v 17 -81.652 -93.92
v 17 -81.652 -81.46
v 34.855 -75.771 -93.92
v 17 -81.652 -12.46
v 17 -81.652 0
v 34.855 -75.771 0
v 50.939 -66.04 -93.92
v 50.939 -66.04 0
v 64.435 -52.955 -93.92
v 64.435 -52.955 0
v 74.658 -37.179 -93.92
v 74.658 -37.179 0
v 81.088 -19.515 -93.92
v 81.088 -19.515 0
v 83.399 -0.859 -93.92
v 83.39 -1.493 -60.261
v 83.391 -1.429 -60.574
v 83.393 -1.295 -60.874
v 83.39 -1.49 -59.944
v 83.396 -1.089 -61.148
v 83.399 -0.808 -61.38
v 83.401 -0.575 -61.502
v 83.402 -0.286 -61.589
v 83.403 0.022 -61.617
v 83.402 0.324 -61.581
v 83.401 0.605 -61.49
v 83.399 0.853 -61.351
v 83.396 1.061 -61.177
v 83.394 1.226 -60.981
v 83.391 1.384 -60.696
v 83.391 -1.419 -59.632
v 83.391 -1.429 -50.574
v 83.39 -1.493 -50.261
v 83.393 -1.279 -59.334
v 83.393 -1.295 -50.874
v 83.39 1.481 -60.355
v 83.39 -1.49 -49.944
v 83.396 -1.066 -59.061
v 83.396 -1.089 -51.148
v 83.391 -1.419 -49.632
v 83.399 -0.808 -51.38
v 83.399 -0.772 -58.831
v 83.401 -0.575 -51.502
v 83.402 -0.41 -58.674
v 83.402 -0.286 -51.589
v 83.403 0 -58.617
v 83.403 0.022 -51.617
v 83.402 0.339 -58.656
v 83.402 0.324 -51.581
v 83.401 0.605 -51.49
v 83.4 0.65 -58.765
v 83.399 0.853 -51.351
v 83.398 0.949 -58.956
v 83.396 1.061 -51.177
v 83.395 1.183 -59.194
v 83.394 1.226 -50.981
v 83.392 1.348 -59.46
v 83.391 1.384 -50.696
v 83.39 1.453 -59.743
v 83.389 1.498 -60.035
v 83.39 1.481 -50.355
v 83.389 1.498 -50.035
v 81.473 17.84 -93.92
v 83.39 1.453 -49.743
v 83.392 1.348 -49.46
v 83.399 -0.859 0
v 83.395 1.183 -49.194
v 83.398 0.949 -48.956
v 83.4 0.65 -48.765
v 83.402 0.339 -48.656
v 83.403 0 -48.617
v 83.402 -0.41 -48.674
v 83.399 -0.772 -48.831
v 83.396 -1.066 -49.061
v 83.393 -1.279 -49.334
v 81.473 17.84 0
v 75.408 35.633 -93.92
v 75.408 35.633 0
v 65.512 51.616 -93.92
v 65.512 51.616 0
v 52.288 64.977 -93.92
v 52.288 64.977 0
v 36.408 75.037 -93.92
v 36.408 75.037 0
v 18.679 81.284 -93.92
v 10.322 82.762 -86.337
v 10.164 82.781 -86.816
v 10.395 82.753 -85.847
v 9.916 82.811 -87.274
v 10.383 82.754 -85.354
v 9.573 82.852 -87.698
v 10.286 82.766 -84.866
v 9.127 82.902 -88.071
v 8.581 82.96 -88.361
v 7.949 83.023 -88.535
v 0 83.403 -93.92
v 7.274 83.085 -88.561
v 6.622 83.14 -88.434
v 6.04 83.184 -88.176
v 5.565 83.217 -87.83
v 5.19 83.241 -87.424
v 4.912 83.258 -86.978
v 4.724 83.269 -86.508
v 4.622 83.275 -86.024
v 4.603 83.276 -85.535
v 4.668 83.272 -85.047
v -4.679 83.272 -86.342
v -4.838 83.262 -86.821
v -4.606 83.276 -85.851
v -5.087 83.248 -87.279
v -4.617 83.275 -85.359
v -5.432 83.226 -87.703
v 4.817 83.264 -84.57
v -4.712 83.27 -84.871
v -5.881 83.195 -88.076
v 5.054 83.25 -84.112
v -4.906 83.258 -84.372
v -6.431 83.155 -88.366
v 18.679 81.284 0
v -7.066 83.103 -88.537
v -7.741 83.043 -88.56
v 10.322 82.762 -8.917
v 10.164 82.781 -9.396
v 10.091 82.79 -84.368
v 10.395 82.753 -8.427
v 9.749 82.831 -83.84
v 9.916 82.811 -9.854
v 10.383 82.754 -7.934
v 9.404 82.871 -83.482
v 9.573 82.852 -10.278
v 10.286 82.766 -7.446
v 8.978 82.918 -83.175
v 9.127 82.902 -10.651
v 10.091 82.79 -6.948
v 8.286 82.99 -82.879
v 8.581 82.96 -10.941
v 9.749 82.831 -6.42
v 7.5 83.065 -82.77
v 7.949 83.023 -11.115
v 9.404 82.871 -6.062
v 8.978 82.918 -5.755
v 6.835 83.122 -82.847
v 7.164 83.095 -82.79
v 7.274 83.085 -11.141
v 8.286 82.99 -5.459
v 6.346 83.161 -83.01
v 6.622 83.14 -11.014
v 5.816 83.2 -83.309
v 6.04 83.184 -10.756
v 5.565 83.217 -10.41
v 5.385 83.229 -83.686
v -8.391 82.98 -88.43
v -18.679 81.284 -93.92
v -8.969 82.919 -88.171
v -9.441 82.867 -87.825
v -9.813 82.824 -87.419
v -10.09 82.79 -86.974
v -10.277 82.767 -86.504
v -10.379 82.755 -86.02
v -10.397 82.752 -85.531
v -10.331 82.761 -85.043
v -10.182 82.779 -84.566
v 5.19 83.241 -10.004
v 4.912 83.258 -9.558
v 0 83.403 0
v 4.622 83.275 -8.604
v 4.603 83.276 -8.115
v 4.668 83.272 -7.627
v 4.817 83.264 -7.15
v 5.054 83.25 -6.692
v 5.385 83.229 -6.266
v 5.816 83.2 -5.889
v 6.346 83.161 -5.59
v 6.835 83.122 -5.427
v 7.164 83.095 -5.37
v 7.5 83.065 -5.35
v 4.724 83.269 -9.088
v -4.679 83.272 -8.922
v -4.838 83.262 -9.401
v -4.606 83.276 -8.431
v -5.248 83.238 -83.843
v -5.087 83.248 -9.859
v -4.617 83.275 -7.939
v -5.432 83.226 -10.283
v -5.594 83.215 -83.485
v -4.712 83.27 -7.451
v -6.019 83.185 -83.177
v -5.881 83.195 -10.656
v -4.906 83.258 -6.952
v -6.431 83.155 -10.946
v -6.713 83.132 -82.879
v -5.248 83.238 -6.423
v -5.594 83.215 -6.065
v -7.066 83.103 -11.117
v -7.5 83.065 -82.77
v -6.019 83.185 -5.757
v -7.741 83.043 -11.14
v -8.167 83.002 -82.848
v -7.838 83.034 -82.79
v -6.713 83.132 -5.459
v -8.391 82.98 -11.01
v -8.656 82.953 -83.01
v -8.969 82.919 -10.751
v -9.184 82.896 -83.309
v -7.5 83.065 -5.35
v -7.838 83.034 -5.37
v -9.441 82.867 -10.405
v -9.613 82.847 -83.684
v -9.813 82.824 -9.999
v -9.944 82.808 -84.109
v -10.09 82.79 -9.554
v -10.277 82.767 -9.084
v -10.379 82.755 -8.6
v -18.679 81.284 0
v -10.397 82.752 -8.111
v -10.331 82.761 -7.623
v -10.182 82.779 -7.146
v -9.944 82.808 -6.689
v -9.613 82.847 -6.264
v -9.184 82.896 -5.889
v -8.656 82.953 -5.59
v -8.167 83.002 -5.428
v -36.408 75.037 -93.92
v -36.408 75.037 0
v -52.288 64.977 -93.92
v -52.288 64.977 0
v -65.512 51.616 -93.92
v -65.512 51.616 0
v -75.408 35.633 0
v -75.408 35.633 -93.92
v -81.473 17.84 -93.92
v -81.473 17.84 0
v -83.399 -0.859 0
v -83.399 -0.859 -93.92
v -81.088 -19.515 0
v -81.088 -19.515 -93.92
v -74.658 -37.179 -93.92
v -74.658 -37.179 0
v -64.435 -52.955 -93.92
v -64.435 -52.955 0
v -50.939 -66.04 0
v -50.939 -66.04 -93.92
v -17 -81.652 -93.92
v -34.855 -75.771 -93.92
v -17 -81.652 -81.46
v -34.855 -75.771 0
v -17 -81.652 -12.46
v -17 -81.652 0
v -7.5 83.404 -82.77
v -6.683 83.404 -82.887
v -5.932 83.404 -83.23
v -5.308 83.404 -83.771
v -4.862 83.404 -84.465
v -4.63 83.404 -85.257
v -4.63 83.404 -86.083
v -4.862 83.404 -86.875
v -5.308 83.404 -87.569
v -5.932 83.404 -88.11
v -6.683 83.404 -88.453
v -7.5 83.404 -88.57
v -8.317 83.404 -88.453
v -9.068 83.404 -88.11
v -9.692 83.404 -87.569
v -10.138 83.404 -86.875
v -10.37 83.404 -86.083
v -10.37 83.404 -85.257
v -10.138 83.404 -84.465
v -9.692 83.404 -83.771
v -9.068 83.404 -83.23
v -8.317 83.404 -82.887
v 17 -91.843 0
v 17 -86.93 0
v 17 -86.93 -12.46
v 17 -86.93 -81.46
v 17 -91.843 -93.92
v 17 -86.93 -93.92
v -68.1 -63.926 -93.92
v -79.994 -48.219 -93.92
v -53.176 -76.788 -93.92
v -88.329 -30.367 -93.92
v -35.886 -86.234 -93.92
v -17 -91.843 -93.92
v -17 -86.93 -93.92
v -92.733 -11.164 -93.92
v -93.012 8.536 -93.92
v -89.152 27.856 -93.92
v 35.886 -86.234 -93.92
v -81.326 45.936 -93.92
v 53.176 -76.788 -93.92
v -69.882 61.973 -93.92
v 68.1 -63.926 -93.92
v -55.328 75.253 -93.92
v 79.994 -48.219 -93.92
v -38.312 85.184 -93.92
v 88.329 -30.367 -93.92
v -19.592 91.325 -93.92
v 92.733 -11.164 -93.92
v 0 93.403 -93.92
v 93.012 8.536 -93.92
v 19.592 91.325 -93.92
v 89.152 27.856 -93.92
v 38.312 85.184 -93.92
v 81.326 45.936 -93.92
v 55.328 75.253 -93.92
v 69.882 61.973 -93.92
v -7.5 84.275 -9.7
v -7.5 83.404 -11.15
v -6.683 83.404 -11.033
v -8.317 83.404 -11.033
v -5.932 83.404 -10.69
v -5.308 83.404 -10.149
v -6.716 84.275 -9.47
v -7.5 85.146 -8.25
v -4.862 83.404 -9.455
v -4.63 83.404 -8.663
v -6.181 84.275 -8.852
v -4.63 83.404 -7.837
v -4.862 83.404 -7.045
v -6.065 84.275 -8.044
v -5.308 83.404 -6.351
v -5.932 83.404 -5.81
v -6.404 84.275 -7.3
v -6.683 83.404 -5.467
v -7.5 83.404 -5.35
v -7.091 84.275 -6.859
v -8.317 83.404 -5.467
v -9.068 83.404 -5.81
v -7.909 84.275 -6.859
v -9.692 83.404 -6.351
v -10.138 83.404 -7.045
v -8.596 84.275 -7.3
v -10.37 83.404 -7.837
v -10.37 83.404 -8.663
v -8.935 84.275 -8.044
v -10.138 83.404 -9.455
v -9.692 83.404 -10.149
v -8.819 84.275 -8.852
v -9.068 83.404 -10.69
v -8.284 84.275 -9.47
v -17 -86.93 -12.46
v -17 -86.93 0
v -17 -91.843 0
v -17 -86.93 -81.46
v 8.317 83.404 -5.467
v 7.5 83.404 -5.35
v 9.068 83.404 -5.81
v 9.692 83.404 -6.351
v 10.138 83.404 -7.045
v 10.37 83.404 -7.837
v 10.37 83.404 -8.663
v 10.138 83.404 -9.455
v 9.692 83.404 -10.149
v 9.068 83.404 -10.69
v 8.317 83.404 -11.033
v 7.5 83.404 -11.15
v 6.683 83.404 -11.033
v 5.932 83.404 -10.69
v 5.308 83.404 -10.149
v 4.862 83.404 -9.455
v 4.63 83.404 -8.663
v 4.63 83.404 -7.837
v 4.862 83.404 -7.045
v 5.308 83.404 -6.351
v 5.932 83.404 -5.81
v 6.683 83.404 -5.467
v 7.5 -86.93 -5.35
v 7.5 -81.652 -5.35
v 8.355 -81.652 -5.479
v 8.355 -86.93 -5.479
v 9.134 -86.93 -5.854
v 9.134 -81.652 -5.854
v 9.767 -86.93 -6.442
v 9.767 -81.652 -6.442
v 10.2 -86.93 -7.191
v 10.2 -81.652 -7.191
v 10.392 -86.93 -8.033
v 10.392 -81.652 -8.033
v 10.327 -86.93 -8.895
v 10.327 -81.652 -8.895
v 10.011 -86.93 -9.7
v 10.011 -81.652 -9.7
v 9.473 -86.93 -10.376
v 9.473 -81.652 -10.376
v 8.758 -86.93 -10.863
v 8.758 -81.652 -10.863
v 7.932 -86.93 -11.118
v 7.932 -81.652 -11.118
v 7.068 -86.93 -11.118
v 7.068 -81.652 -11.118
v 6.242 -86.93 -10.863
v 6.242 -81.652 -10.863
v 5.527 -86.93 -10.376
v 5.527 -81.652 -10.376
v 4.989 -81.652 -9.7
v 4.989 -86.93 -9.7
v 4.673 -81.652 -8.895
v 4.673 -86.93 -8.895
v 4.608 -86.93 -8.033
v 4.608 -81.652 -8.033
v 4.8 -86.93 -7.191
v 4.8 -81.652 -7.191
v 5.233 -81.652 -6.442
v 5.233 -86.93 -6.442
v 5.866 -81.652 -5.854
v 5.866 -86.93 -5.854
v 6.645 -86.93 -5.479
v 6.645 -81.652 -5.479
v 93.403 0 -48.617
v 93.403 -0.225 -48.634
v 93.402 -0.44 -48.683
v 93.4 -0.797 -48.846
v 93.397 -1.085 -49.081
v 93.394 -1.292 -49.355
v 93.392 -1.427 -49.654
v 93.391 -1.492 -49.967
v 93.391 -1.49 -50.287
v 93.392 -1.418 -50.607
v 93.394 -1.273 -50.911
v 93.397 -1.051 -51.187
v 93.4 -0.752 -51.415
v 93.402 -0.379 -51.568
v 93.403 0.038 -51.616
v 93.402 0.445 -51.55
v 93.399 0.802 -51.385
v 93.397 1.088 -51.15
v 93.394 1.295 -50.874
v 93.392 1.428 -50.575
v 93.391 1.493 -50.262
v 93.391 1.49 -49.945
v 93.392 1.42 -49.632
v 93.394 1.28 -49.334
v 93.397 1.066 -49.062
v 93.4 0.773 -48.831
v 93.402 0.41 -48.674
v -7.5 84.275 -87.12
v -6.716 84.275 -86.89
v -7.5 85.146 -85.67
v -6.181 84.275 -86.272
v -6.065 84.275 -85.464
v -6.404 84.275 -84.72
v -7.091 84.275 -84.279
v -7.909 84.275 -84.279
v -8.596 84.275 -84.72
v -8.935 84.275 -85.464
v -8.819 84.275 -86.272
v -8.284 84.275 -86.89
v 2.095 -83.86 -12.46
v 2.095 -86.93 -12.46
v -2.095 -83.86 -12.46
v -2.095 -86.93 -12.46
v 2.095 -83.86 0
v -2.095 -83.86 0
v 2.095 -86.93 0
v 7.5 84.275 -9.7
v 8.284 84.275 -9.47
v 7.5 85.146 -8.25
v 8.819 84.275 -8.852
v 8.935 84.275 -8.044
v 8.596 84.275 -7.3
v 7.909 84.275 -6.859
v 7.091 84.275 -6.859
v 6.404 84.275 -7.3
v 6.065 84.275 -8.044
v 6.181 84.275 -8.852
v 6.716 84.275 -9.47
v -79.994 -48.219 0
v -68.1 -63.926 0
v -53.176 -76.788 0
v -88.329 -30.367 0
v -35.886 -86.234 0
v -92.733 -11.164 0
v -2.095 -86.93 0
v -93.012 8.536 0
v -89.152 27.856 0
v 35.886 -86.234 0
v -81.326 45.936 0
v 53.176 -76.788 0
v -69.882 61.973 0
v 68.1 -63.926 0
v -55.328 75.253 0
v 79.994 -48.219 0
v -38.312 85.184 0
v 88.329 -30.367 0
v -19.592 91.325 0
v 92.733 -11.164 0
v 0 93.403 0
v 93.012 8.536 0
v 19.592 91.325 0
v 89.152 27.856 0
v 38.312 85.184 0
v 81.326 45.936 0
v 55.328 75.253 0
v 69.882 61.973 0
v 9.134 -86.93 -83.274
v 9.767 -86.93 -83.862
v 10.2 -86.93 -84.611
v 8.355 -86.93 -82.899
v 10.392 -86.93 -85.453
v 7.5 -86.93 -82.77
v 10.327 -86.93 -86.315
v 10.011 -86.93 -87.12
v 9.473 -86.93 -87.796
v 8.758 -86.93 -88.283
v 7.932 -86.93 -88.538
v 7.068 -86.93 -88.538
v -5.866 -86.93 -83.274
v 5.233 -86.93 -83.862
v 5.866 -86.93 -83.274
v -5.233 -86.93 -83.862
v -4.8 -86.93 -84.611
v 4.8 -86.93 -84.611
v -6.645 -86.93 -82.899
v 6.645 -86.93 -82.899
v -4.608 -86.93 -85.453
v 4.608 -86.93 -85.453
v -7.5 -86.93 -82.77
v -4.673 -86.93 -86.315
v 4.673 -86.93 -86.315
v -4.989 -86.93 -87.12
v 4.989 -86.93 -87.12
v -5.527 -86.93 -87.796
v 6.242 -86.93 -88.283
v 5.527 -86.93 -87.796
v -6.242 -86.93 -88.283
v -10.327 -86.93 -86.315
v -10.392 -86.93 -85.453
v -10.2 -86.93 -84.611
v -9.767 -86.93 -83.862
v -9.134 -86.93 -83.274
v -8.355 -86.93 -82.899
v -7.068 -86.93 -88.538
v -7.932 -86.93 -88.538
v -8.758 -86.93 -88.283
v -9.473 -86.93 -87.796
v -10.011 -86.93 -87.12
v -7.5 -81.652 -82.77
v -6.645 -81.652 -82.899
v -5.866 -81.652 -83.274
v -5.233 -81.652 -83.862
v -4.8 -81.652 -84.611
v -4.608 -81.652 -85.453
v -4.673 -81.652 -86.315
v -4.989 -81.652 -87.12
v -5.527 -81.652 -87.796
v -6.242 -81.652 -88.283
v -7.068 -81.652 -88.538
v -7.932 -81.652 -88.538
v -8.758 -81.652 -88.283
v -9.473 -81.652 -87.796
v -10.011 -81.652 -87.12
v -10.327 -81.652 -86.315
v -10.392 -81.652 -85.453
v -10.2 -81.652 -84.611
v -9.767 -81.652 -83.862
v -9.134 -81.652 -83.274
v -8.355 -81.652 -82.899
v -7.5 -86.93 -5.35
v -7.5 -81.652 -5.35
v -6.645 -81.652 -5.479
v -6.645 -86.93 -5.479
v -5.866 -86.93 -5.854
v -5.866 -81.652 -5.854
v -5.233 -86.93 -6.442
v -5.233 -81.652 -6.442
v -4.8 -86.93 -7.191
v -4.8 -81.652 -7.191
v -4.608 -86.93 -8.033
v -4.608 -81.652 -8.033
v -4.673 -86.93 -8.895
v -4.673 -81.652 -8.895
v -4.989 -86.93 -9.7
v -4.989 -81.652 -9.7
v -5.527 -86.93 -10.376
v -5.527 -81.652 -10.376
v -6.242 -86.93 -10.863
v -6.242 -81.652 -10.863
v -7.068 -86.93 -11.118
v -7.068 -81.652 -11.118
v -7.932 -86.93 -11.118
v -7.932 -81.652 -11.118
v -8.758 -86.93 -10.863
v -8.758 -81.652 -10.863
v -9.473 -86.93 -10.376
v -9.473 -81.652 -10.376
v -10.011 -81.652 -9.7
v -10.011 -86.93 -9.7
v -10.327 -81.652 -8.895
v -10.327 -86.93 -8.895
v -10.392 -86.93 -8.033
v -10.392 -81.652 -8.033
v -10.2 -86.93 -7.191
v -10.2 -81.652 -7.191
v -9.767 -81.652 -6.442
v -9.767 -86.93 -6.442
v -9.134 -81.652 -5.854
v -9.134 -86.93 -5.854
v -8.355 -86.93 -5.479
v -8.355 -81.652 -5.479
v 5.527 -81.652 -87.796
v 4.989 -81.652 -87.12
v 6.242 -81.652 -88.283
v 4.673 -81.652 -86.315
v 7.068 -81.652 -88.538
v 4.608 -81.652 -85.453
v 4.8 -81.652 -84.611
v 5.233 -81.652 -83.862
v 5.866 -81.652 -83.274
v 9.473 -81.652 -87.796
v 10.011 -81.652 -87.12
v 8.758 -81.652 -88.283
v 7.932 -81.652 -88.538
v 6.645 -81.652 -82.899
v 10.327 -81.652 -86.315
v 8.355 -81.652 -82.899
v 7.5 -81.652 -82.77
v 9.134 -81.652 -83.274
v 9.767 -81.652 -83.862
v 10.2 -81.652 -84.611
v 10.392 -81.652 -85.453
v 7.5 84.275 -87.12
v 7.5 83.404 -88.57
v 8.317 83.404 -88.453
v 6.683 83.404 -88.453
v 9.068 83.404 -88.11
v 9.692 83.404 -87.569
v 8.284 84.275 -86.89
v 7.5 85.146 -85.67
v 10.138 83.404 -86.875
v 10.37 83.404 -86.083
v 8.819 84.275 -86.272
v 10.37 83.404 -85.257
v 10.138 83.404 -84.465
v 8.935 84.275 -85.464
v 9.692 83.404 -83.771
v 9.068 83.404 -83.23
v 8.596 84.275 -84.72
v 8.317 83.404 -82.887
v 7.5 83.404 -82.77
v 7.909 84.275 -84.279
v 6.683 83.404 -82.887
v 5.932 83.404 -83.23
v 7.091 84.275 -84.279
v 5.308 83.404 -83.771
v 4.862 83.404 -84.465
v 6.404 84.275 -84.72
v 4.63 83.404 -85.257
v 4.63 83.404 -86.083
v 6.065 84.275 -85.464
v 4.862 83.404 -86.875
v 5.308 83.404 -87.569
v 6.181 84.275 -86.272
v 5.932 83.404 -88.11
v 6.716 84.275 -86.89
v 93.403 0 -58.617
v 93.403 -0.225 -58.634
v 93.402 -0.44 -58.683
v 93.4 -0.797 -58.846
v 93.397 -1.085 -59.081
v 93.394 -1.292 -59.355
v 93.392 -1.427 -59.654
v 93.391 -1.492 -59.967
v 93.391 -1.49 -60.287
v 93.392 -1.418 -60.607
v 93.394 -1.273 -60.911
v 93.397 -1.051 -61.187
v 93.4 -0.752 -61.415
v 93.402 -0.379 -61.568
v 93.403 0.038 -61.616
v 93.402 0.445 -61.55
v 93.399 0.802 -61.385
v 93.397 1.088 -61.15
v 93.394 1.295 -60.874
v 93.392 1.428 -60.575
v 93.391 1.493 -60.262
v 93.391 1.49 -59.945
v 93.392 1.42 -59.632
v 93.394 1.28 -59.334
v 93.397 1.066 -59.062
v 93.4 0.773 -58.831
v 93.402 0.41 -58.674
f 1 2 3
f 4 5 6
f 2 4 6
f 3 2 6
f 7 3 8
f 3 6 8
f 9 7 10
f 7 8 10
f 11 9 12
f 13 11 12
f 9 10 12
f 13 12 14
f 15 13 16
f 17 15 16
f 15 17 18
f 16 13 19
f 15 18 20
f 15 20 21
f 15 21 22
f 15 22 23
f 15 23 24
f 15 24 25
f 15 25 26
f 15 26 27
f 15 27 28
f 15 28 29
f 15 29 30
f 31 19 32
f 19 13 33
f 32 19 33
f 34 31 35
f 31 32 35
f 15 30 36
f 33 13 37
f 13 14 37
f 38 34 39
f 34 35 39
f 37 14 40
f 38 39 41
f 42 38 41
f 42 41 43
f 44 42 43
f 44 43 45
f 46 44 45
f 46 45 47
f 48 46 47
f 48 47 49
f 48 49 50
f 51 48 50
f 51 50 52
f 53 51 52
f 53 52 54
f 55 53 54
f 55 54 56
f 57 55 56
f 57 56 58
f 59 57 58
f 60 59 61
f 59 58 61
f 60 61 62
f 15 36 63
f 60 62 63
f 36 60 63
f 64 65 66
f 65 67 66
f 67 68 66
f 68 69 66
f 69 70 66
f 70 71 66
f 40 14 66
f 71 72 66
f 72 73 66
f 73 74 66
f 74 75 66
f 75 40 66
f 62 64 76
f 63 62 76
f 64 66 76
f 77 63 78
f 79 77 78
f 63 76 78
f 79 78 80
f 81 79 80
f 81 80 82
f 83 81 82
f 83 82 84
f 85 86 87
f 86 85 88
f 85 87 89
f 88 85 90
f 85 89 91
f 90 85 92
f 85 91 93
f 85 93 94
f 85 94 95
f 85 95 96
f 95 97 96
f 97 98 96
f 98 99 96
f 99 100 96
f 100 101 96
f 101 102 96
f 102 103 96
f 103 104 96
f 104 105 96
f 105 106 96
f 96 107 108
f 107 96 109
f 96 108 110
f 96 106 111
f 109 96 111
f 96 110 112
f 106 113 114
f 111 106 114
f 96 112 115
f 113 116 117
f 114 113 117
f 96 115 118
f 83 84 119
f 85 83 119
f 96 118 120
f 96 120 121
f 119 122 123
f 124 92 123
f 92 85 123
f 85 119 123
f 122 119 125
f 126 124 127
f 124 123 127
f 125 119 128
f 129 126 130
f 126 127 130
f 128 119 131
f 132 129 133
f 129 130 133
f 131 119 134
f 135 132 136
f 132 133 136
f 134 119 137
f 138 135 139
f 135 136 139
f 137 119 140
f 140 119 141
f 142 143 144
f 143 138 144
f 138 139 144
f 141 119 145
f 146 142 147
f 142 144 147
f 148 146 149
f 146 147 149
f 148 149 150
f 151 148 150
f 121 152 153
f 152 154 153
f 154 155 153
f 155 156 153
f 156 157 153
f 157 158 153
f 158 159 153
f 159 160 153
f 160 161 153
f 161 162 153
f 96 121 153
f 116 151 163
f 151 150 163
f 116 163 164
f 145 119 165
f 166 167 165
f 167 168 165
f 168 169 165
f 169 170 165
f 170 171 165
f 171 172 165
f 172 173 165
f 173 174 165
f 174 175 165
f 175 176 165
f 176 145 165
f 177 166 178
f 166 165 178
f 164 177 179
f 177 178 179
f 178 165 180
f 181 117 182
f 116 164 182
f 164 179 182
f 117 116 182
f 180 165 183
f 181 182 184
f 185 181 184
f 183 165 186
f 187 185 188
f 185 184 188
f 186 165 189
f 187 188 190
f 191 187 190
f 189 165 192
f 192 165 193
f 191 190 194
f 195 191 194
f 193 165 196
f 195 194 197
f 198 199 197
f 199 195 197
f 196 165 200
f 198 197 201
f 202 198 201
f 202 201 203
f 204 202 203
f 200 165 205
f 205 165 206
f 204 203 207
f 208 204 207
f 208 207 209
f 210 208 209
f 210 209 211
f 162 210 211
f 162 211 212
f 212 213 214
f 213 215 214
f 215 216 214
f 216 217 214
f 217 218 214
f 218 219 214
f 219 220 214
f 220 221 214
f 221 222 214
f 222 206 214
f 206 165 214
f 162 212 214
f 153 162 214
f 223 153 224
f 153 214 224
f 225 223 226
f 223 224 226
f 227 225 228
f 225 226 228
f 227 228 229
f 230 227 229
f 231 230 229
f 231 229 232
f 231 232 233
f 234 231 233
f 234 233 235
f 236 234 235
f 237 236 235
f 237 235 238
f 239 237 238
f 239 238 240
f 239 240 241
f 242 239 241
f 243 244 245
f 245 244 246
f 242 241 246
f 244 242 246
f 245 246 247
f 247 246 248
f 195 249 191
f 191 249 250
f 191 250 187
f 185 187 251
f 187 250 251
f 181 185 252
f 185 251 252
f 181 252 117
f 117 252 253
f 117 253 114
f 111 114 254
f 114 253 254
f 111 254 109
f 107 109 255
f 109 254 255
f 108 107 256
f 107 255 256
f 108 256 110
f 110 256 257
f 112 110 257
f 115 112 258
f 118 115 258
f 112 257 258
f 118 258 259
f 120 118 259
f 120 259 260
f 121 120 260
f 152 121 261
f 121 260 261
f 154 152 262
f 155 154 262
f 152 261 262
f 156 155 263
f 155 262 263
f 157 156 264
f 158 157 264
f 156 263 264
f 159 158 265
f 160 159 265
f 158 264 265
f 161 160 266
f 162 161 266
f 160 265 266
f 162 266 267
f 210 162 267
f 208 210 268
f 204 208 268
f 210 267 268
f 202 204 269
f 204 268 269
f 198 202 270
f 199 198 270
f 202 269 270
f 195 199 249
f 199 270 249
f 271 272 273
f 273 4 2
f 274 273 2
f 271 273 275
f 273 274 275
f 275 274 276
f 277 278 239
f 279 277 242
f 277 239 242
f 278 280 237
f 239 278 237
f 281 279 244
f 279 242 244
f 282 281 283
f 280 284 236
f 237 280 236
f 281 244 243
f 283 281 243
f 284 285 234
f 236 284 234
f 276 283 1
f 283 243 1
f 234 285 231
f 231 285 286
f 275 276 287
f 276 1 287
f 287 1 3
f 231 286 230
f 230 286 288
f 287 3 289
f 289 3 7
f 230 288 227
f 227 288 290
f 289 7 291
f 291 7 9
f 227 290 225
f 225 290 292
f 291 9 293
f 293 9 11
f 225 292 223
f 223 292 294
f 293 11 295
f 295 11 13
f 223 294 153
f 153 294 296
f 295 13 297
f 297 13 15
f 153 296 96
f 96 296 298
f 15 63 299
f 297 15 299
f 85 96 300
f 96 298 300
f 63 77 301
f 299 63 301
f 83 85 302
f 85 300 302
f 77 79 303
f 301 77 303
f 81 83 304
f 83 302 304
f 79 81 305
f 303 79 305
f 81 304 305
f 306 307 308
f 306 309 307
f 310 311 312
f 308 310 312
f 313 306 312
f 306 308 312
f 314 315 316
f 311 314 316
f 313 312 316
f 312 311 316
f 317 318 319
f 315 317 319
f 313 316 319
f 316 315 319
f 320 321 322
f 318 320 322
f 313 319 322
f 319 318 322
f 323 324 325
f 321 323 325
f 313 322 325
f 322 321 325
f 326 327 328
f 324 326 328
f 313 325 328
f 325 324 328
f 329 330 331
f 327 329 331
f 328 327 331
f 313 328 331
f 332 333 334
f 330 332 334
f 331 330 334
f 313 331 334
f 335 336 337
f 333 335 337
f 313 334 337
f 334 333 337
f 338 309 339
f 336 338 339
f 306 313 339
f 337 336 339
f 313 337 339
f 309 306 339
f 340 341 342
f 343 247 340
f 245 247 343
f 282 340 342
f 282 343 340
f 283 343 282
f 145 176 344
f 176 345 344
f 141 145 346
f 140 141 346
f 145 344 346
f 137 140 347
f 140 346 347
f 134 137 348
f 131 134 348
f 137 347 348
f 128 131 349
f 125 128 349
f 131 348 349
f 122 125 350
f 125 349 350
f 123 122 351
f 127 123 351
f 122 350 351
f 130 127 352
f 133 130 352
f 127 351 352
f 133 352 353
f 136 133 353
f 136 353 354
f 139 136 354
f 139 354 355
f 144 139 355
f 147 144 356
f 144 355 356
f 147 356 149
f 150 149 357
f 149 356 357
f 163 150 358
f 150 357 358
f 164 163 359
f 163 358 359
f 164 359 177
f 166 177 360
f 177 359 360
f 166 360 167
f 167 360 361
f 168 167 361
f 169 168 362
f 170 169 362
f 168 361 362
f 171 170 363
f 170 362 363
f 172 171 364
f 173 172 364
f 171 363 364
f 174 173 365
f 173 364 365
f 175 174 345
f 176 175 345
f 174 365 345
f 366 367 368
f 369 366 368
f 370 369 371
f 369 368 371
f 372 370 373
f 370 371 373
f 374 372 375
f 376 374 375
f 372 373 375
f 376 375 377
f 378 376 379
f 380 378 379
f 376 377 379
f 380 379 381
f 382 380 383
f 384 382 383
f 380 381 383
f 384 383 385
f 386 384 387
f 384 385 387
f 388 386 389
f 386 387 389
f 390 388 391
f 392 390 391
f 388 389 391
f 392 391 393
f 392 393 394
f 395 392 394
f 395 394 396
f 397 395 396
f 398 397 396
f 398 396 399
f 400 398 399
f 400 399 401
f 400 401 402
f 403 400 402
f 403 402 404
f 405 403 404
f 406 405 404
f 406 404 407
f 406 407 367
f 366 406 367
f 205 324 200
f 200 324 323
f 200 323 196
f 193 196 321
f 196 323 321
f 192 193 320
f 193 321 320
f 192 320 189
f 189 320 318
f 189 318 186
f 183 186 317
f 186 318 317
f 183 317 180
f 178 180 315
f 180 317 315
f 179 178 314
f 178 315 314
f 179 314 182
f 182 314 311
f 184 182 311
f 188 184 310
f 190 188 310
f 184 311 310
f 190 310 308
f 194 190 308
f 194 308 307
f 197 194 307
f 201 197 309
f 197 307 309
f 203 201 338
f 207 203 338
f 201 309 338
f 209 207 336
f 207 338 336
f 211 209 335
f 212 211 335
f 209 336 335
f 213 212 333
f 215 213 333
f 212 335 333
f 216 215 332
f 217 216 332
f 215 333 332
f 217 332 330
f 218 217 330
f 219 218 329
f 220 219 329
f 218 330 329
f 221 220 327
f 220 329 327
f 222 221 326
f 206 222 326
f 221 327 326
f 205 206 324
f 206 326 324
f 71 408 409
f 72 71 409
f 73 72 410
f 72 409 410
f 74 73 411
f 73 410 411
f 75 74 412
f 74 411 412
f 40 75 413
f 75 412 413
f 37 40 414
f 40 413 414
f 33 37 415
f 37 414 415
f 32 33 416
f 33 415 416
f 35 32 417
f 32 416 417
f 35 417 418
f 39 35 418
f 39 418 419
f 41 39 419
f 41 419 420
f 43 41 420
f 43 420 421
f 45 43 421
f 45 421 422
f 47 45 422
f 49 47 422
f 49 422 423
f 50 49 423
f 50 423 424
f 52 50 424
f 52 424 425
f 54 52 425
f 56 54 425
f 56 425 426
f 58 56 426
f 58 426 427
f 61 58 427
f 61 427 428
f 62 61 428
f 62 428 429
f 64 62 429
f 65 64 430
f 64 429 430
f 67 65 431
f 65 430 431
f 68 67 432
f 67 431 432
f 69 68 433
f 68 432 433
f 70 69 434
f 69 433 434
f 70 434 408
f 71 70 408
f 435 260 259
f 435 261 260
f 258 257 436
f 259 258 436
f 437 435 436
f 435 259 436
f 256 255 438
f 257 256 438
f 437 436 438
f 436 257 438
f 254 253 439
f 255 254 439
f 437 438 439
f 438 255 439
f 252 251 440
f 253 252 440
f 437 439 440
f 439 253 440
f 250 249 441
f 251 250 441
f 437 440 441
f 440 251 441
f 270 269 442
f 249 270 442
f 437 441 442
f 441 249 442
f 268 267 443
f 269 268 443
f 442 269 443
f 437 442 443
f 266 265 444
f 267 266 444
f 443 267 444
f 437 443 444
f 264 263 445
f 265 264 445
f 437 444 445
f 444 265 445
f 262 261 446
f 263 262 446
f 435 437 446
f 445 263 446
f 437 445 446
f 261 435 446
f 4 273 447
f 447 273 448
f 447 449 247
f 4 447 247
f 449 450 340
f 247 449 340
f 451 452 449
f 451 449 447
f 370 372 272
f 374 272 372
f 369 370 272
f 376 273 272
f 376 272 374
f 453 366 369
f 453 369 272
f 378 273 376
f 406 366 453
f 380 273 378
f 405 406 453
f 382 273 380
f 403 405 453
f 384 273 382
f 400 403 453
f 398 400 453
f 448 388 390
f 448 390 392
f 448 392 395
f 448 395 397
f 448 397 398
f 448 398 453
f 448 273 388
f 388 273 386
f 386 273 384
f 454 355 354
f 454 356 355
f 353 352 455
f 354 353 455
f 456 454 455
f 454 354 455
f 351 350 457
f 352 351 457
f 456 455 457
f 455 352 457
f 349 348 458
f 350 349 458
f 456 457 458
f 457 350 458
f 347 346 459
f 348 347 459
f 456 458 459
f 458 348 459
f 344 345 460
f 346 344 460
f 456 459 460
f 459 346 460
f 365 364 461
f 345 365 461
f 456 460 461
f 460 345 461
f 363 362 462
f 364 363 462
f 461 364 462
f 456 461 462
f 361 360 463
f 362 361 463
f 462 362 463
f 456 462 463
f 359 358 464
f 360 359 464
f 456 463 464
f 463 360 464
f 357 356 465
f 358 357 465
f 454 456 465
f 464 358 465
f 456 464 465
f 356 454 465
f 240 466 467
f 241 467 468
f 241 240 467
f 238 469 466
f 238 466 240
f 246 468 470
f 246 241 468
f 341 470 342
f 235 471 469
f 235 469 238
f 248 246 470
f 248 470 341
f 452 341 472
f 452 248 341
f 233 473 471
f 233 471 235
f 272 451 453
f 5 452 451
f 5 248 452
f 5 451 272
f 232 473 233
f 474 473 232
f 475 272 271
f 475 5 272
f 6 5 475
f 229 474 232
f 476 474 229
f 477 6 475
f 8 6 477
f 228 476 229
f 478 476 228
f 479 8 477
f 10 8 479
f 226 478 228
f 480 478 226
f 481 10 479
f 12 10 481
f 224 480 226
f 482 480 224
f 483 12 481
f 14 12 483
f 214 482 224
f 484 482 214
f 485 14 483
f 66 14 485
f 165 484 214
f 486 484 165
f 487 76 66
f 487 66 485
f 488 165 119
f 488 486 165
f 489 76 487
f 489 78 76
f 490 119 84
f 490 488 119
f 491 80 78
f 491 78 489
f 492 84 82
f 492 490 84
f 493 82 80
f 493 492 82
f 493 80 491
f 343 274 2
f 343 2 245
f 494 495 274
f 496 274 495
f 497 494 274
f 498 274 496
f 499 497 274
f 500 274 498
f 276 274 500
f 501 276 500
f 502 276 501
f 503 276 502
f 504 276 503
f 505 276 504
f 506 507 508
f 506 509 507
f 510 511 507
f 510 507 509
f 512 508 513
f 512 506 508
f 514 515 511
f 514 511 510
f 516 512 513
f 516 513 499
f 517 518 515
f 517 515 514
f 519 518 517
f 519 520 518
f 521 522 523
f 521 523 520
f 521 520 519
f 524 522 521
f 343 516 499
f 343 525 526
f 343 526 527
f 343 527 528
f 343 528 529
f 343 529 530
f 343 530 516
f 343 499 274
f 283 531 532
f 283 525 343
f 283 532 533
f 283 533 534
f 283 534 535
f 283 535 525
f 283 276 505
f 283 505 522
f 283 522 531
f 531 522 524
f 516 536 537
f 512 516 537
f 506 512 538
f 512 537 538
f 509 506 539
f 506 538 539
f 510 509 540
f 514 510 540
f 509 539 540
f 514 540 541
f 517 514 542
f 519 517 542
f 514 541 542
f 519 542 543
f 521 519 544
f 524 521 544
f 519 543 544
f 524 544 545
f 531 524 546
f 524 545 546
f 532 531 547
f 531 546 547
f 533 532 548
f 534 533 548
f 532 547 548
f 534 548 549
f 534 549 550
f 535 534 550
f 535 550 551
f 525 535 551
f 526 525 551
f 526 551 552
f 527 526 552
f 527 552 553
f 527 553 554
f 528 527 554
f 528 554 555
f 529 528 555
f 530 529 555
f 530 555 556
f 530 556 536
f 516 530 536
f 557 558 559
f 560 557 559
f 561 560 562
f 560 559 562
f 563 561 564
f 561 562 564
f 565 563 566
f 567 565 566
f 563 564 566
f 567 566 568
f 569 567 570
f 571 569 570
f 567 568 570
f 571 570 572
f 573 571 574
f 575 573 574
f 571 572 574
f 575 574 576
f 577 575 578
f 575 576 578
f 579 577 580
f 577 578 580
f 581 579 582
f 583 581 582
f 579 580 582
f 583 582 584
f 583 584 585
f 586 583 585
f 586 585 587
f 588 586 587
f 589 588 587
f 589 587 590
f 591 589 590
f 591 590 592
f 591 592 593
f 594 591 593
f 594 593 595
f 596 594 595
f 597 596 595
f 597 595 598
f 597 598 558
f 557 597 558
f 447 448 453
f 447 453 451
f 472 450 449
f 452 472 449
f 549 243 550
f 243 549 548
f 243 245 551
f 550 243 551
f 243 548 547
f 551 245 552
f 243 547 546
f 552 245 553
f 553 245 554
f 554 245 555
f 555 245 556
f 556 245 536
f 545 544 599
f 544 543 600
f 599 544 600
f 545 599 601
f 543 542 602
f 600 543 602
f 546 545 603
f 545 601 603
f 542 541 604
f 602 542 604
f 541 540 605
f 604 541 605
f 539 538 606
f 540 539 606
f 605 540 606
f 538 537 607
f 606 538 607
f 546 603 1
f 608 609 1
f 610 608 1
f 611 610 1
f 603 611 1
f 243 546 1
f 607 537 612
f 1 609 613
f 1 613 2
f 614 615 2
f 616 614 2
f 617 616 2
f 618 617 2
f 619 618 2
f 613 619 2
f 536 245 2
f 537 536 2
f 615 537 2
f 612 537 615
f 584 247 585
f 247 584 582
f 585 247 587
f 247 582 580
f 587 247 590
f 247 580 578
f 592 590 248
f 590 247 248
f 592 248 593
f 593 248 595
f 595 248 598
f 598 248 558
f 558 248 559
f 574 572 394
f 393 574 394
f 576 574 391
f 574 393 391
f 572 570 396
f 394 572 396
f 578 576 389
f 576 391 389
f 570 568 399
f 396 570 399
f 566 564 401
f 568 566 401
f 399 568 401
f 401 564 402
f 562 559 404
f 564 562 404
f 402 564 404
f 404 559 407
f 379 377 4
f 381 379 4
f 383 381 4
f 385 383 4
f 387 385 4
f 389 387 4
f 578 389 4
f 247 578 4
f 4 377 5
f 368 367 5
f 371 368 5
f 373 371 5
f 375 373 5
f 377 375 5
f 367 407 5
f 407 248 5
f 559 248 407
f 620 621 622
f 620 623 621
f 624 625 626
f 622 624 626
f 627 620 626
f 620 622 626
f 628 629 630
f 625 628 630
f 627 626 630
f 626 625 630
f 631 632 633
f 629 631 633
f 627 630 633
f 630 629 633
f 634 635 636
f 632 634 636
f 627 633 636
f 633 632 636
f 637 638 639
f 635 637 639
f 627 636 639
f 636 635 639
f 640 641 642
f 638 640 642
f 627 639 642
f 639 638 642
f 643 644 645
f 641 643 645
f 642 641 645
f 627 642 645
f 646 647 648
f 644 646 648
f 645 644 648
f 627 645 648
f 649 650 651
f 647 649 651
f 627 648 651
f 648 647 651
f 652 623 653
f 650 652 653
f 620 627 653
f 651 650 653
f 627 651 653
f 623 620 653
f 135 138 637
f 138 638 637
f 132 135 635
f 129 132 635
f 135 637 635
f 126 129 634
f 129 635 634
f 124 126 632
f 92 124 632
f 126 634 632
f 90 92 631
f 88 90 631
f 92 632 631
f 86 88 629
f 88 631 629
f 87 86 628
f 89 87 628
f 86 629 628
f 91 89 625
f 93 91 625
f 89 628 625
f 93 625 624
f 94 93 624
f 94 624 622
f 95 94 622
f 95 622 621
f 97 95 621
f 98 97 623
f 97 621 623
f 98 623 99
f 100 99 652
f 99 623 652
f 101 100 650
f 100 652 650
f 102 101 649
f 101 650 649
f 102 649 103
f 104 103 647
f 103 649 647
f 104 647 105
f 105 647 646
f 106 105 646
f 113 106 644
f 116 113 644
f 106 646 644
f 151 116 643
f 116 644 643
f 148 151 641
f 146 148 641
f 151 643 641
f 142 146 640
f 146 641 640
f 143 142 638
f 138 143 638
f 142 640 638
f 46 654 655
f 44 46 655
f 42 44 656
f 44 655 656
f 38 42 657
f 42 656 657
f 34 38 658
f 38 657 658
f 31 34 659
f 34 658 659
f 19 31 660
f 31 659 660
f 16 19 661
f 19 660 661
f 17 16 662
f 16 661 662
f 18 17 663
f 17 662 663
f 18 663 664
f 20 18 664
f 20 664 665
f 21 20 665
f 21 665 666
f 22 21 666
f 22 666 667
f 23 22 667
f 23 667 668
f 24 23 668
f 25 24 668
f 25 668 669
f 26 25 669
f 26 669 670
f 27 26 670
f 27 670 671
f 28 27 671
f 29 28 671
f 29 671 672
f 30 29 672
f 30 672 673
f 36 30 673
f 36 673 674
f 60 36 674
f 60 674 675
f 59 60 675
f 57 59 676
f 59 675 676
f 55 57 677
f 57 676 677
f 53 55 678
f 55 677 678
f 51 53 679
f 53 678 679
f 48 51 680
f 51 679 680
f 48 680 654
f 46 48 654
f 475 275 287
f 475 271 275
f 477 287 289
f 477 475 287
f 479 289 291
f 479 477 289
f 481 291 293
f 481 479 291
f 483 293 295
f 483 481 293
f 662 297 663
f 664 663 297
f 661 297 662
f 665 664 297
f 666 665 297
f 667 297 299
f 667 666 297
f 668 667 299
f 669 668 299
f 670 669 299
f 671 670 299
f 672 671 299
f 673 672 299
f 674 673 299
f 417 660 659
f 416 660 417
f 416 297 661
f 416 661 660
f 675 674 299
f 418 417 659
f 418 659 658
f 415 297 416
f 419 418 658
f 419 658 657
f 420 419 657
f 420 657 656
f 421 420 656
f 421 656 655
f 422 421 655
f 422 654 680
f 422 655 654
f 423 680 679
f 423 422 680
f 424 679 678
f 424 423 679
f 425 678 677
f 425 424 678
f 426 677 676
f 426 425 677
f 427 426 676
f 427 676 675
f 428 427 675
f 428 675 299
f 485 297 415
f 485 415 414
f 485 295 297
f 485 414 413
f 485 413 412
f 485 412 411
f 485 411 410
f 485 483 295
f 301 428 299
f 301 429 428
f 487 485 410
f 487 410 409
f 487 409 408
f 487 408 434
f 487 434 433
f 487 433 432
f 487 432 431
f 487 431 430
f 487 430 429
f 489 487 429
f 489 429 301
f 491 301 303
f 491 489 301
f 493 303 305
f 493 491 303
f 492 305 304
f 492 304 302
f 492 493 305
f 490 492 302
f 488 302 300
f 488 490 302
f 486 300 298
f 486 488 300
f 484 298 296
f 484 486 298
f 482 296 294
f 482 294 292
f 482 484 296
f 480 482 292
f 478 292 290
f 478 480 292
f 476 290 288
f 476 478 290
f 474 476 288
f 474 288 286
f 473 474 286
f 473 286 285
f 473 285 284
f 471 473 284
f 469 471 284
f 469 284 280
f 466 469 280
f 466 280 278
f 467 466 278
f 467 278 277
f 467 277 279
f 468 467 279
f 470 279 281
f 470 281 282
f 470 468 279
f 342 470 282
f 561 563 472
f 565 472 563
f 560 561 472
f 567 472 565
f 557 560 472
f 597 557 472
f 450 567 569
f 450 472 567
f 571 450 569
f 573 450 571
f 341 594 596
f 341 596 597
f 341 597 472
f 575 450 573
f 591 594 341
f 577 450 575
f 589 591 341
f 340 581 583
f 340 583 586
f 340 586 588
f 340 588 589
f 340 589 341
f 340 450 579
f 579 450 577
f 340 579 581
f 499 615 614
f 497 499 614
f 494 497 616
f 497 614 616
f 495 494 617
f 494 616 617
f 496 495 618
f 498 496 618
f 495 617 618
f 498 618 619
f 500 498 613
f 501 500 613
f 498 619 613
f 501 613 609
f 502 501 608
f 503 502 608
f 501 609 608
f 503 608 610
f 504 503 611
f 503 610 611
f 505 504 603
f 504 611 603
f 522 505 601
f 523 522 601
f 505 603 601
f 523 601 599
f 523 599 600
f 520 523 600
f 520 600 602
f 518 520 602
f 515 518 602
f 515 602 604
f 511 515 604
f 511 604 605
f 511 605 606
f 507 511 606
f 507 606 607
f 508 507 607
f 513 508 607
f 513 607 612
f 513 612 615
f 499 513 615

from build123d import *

# Parameters (mm, degrees)
SKETCH1_R                 = 93.40293561
SKETCH1_R_2               = 83.40293561
BOSS_EXTRUDE1_DEPTH       = 93.92
BOSS_EXTRUDE3_DEPTH       = 93.92
CUT_EXTRUDE1_REACH        = 231.001
SKETCH2_W                 = 34
SKETCH2_H                 = 69
CUT_EXTRUDE2_START        = -6.472936
SKETCH3_W                 = 34
SKETCH3_H                 = 12.46
CUT_EXTRUDE2_DEPTH        = 6.472936
M5_CLEARANCE_HOLE1_D      = 5.8
M5_CLEARANCE_HOLE1_DEPTH  = 170.33393561
M5_CLEARANCE_HOLE1_TIP    = 1.742495795
SKETCH8_W                 = 4.19
SKETCH8_H                 = 3.07
CUT_EXTRUDE3_DEPTH        = 12.46
M6_CLEARANCE_HOLE1_REACH  = 219.335
M6_CLEARANCE_HOLE1_BORE_R = 1.5


with BuildPart() as part:
    # Sketch1 → Boss-Extrude1 (new body)
    with BuildSketch(Plane.XY):
        Circle(SKETCH1_R)
        Circle(SKETCH1_R_2, mode=Mode.SUBTRACT)
    extrude(amount=-BOSS_EXTRUDE1_DEPTH)

    # Sketch7 → Boss-Extrude3 (add)
    with BuildSketch(Plane.XY):
        with BuildLine():
            Line((-17, -81.652003456), (17, -81.652003456))
            ThreePointArc((17, -81.652003456), (0, -83.40293561), (-17, -81.652003456))
        make_face()
    extrude(amount=-BOSS_EXTRUDE3_DEPTH)

    # Sketch2 → Cut-Extrude1 (cut, up to next)
    with BuildSketch(Plane(origin=(0, -93.40293561, 0), x_dir=(-1, 0, 0), z_dir=(0, -1, 0)), mode=Mode.PRIVATE) as cut_extrude1_sk1:
        with Locations((0, 46.96)):
            Rectangle(SKETCH2_W, SKETCH2_H)
    cut_extrude1_tool1 = extrude(cut_extrude1_sk1.sketch, amount=-CUT_EXTRUDE1_REACH, mode=Mode.PRIVATE) & part.part
    add(cut_extrude1_tool1.solids().sort_by_distance((0, -93.402936, -46.96))[0], mode=Mode.SUBTRACT)

    # Sketch3 → Cut-Extrude2 (cut)
    with BuildSketch(Plane(origin=(0, -93.40293561, 0), x_dir=(-1, 0, 0), z_dir=(0, -1, 0)).offset(CUT_EXTRUDE2_START)):
        with Locations((0, 87.69)):
            Rectangle(SKETCH3_W, SKETCH3_H)
        with Locations((0, 6.23)):
            Rectangle(SKETCH3_W, SKETCH3_H)
    extrude(amount=CUT_EXTRUDE2_DEPTH, mode=Mode.SUBTRACT)

    # M5 Clearance Hole1
    with Locations(Plane(origin=(-7.5, -86.93, -8.25), x_dir=(0, 0, -1), z_dir=(0, -1, 0))):
        with Locations((0, 0), (0, 15), (77.42, 0), (77.42, 15)):
            Hole(M5_CLEARANCE_HOLE1_D / 2, depth=M5_CLEARANCE_HOLE1_DEPTH)
            with Locations((0, 0, -(M5_CLEARANCE_HOLE1_DEPTH + M5_CLEARANCE_HOLE1_TIP / 2))):  # 118° drill point
                Cone(0, M5_CLEARANCE_HOLE1_D / 2, M5_CLEARANCE_HOLE1_TIP, mode=Mode.SUBTRACT)

    # Sketch8 → Cut-Extrude3 (cut)
    with BuildSketch(Plane.XY):
        with Locations((0, -85.395)):
            Rectangle(SKETCH8_W, SKETCH8_H)
    extrude(amount=-CUT_EXTRUDE3_DEPTH, mode=Mode.SUBTRACT)

    # M6 Clearance Hole1 bore (on position points) → M6 Clearance Hole1 (cut, up to next)
    with BuildSketch(Plane(origin=(93.40293561, 0, -60.116902822), x_dir=(0, 0, 1), z_dir=(1, 0, 0)), mode=Mode.PRIVATE) as m6_clearance_hole1_sk1:
        Circle(M6_CLEARANCE_HOLE1_BORE_R)
    m6_clearance_hole1_tool1 = extrude(m6_clearance_hole1_sk1.sketch, amount=-M6_CLEARANCE_HOLE1_REACH, mode=Mode.PRIVATE) & part.part
    # M6 Clearance Hole1 bore (on position points) → M6 Clearance Hole1 (cut, up to next)
    with BuildSketch(Plane(origin=(93.40293561, 0, -60.116902822), x_dir=(0, 0, 1), z_dir=(1, 0, 0)), mode=Mode.PRIVATE) as m6_clearance_hole1_sk2:
        with Locations((10, 0)):
            Circle(M6_CLEARANCE_HOLE1_BORE_R)
    m6_clearance_hole1_tool2 = extrude(m6_clearance_hole1_sk2.sketch, amount=-M6_CLEARANCE_HOLE1_REACH, mode=Mode.PRIVATE) & part.part
    add(m6_clearance_hole1_tool1.solids().sort_by_distance((93.402936, 0, -60.116903))[0], mode=Mode.SUBTRACT)
    add(m6_clearance_hole1_tool2.solids().sort_by_distance((93.402936, 0, -50.116903))[0], mode=Mode.SUBTRACT)


solid = part.part
